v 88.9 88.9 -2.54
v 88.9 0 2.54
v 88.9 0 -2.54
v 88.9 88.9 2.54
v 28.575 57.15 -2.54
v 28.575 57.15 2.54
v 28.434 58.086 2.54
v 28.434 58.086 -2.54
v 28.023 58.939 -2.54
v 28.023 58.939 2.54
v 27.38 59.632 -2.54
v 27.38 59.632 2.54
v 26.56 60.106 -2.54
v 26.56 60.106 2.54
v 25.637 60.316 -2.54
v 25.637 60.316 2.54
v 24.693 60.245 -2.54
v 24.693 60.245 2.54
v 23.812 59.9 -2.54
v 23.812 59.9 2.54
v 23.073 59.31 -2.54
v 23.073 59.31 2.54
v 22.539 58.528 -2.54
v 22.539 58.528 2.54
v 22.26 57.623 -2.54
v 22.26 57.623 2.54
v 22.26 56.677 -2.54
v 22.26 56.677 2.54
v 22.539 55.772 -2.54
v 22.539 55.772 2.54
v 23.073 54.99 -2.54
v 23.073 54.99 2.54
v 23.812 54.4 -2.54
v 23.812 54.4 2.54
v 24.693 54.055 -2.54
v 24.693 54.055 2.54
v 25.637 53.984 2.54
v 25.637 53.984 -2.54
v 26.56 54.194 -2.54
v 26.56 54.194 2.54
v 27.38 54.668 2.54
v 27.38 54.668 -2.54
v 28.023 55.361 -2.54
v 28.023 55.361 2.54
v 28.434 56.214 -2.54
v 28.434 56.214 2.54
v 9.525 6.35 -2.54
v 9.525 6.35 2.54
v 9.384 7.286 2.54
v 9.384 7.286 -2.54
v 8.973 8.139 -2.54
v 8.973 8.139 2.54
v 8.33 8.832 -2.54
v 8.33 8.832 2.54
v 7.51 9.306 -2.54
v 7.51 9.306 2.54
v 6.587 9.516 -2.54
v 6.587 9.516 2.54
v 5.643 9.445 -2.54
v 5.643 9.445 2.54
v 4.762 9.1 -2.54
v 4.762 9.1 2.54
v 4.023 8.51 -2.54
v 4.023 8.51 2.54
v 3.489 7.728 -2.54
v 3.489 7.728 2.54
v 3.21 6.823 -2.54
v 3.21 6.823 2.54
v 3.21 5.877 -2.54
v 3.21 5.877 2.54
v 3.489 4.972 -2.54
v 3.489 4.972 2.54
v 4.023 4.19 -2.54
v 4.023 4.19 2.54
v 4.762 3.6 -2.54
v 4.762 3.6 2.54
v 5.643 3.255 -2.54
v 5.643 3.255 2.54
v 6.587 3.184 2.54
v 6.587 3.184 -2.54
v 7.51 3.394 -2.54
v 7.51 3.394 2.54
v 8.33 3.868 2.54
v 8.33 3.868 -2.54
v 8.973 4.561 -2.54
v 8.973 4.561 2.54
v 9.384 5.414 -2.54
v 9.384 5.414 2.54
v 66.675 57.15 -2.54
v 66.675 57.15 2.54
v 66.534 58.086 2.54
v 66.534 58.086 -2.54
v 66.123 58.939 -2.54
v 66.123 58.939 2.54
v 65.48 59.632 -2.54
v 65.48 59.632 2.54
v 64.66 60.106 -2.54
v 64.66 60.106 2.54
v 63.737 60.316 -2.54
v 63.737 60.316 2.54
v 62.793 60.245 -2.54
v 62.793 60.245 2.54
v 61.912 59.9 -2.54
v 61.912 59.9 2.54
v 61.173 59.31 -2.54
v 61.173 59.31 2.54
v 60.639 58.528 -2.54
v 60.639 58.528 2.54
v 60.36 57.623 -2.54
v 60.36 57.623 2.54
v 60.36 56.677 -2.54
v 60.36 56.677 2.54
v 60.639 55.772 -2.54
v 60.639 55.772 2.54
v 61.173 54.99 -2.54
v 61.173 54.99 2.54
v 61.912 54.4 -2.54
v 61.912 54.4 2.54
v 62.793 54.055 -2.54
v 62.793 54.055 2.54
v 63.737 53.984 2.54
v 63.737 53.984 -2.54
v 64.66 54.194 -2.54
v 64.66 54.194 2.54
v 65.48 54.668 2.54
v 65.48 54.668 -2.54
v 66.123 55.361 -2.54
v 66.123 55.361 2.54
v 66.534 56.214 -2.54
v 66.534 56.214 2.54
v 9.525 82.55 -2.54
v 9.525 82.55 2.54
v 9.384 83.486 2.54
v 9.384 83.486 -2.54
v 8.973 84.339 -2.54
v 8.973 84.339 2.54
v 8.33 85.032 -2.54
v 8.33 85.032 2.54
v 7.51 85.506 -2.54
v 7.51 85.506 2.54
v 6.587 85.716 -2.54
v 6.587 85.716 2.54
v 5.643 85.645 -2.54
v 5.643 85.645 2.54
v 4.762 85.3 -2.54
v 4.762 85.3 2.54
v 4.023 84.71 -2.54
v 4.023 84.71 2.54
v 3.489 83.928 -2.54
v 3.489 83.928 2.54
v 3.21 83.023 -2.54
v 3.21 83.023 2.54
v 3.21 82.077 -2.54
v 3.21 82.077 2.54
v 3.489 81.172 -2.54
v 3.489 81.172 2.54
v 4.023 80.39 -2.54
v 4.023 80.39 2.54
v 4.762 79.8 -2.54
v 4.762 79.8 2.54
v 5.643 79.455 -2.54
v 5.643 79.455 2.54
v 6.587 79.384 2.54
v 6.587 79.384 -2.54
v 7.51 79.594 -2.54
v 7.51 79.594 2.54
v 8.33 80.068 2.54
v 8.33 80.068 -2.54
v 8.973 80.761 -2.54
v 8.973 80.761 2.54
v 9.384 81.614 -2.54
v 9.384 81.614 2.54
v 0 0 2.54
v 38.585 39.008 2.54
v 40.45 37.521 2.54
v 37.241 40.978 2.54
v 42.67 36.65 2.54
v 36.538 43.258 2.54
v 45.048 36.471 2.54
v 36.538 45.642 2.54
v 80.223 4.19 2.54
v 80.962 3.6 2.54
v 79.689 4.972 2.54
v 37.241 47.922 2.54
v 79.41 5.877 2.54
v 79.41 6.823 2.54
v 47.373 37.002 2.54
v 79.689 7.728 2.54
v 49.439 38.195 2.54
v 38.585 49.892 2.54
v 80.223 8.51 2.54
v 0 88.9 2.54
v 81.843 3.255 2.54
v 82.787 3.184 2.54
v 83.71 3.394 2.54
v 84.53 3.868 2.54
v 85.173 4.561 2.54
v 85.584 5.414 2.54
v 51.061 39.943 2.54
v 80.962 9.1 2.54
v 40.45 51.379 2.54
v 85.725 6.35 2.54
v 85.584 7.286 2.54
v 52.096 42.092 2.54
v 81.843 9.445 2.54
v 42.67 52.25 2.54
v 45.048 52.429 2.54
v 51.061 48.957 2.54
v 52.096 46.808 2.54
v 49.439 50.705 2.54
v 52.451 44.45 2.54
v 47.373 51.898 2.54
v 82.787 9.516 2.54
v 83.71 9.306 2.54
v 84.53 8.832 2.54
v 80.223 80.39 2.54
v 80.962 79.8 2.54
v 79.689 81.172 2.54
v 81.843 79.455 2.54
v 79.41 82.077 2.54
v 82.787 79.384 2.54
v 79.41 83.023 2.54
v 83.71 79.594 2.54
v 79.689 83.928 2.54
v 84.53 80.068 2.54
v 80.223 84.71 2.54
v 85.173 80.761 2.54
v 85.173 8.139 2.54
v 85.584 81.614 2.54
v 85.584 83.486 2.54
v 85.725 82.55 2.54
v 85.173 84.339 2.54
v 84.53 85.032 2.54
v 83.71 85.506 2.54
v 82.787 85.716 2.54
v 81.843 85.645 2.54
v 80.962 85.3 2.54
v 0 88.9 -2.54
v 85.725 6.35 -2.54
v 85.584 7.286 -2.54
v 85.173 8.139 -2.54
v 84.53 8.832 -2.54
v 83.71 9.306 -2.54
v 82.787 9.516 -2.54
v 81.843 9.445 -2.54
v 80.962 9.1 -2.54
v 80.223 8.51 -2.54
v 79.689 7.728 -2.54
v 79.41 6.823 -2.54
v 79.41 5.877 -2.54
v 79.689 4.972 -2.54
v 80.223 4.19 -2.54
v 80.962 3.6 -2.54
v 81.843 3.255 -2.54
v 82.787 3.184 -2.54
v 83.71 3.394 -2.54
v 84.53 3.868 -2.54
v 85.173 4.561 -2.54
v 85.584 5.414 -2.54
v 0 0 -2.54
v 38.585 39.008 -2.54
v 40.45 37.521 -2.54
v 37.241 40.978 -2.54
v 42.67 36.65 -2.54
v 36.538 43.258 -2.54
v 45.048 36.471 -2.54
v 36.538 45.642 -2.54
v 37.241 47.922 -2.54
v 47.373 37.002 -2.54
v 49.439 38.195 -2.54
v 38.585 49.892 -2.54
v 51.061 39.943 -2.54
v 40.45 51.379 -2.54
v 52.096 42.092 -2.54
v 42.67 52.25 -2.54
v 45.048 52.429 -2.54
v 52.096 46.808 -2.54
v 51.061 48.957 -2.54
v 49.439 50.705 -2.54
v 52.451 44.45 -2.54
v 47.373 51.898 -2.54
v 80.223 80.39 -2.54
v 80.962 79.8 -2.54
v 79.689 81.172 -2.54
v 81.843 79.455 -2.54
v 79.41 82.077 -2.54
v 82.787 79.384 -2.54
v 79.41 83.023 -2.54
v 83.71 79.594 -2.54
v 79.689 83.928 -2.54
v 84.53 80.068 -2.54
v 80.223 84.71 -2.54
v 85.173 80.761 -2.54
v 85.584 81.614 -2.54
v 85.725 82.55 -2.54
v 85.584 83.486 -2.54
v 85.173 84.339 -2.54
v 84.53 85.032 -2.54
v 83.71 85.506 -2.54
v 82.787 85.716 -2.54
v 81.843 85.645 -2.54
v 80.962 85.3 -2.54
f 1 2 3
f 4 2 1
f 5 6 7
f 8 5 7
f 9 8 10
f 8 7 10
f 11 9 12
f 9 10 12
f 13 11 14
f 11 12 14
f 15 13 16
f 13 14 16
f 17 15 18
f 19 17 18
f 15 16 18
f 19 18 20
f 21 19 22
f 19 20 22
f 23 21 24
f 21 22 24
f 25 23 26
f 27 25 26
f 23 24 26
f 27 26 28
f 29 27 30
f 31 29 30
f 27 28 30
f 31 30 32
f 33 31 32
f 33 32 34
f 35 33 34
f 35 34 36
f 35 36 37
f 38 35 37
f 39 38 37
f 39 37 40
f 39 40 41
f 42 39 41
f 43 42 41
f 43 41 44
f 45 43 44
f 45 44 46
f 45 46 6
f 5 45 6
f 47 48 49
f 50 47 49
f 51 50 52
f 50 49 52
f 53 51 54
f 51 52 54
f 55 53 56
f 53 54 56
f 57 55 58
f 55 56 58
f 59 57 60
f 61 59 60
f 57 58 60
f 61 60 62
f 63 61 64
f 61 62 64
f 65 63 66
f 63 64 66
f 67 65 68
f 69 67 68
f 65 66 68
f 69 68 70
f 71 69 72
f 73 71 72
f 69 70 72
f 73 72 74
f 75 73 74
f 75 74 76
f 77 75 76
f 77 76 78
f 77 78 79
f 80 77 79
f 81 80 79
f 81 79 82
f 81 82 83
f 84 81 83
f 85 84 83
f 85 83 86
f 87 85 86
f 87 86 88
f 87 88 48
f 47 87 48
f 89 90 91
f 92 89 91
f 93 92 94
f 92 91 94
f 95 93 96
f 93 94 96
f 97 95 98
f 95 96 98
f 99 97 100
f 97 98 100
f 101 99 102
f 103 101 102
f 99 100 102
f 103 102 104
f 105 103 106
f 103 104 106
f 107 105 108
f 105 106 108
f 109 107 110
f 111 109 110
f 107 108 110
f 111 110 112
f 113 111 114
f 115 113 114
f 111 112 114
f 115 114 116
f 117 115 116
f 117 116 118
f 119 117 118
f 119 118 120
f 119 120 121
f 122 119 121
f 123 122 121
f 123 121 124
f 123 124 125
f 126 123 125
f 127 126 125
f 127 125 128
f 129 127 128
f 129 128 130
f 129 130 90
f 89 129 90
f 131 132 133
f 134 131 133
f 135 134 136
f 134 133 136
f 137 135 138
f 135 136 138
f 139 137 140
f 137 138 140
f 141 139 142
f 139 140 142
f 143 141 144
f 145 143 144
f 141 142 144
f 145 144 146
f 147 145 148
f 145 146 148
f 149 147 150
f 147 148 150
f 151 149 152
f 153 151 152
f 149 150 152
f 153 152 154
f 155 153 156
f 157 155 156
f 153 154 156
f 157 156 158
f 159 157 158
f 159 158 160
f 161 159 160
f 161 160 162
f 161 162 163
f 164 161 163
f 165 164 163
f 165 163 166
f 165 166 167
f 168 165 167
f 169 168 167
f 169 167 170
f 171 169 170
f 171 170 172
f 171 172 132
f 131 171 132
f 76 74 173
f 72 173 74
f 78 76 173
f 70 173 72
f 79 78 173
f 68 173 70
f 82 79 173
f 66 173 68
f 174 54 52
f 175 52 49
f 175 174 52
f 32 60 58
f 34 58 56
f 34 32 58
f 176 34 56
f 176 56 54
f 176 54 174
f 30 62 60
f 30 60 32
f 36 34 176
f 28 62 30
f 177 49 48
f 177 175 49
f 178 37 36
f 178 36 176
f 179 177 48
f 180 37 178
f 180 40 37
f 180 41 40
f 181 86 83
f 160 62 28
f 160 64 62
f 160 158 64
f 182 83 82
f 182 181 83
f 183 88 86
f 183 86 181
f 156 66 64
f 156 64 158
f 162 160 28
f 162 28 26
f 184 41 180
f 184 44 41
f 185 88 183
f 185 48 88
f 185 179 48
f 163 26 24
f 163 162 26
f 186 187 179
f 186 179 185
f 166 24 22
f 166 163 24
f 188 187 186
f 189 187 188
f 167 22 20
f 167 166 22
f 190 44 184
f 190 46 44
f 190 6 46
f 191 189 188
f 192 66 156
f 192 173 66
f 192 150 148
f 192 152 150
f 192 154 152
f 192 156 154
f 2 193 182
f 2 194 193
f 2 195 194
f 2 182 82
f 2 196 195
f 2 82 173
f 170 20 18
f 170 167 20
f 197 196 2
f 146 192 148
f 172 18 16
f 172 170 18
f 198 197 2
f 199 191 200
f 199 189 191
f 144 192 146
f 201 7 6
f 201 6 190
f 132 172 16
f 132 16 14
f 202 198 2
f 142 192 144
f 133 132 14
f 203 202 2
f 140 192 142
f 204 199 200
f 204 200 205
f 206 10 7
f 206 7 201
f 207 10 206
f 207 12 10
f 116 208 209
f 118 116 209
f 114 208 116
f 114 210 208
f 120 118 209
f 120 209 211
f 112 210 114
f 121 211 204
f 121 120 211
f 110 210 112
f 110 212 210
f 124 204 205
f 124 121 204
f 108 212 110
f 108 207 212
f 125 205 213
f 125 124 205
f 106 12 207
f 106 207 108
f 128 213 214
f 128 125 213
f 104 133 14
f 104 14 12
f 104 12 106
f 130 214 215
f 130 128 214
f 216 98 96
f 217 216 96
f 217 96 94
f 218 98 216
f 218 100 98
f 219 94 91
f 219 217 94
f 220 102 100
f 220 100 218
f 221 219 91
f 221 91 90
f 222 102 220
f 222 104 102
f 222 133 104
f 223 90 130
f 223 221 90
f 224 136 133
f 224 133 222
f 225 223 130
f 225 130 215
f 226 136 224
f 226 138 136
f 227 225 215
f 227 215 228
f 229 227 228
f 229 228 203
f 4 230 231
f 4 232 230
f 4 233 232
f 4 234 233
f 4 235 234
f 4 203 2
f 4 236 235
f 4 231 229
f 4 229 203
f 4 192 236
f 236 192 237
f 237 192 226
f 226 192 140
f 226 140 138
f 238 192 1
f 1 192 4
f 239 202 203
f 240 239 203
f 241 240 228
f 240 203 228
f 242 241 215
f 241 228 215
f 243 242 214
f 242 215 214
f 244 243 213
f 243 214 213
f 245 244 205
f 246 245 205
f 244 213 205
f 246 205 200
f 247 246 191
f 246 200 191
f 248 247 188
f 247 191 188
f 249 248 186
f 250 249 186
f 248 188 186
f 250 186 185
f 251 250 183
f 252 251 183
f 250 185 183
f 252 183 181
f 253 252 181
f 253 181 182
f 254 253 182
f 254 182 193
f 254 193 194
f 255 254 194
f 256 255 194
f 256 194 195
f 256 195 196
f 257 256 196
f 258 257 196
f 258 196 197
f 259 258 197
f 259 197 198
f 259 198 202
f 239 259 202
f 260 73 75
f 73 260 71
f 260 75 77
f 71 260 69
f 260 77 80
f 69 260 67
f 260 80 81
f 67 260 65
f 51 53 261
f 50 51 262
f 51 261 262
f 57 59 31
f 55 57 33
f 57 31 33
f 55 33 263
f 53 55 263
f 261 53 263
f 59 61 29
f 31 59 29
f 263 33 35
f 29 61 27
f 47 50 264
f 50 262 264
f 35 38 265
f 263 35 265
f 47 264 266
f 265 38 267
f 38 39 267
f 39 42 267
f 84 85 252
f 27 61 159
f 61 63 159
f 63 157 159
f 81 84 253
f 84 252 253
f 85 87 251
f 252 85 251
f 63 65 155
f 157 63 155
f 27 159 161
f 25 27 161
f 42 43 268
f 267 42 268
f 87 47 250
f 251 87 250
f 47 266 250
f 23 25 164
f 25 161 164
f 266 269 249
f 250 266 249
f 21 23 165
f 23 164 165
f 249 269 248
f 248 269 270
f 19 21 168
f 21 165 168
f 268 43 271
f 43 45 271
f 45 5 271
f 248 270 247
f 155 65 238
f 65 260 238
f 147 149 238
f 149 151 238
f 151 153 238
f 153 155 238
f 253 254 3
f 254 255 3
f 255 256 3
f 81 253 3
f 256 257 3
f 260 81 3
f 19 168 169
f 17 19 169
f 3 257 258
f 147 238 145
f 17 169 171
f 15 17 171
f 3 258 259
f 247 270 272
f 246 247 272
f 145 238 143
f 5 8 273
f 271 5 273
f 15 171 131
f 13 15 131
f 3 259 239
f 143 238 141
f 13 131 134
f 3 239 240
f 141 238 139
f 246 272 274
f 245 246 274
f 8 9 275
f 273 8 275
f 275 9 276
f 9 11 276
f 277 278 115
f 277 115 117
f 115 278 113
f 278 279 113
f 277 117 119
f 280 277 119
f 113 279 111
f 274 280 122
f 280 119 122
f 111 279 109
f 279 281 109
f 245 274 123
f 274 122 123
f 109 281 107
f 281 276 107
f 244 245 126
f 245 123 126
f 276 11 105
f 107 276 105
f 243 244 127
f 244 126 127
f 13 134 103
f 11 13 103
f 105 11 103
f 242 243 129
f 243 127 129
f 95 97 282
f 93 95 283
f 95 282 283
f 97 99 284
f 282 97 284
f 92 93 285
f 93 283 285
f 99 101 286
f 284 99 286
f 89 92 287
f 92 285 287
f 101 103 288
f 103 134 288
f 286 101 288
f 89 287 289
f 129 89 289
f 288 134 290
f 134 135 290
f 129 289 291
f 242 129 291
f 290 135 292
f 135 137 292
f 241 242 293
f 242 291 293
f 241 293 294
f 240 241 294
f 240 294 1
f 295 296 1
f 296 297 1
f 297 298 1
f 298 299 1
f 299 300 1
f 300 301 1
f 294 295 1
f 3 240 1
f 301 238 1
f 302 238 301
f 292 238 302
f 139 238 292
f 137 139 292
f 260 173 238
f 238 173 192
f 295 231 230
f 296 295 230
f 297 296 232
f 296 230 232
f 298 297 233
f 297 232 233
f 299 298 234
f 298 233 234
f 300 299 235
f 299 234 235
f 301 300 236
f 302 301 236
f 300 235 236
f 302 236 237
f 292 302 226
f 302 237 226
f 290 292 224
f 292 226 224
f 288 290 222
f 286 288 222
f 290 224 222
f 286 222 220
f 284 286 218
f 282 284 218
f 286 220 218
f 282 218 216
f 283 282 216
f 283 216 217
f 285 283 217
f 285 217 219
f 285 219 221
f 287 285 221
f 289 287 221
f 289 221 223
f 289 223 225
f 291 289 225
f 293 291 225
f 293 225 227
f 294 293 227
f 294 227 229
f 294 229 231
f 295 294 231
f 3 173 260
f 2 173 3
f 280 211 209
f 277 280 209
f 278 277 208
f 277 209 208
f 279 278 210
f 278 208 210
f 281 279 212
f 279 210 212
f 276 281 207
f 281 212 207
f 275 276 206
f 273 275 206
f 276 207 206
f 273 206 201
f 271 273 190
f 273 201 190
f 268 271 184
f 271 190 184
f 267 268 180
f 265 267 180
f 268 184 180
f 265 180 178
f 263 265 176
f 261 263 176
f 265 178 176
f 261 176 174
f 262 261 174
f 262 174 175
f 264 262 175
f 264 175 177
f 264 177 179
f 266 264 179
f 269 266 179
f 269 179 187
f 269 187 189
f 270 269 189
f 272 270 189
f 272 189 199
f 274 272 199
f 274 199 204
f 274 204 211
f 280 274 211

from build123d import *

# Parameters (mm, degrees)
SKETCH1_W           = 88.9
SKETCH1_H           = 88.9
BOSS_EXTRUDE1_DEPTH = 2.54
SKETCH2_R           = 3.175
SKETCH2_R_2         = 8.001
CUT_EXTRUDE1_DEPTH  = 6.08


with BuildPart() as part:
    # Sketch1 → Boss-Extrude1 (new body, symmetric)
    with BuildSketch(Plane.XY):
        with Locations((44.45, 44.45)):
            Rectangle(SKETCH1_W, SKETCH1_H)
    extrude(amount=BOSS_EXTRUDE1_DEPTH, both=True)

    # Sketch2 → Cut-Extrude1 (cut, through all)
    with BuildSketch(Plane.XY.offset(2.54)):
        with Locations((6.35, 82.55)):
            Circle(SKETCH2_R)
        with Locations((82.55, 82.55)):
            Circle(SKETCH2_R)
        with Locations((82.55, 6.35)):
            Circle(SKETCH2_R)
        with Locations((6.35, 6.35)):
            Circle(SKETCH2_R)
        with Locations((44.45, 44.45)):
            Circle(SKETCH2_R_2)
        with Locations((25.4, 57.15)):
            Circle(SKETCH2_R)
        with Locations((63.5, 57.15)):
            Circle(SKETCH2_R)
    extrude(amount=-CUT_EXTRUDE1_DEPTH, mode=Mode.SUBTRACT)


solid = part.part
